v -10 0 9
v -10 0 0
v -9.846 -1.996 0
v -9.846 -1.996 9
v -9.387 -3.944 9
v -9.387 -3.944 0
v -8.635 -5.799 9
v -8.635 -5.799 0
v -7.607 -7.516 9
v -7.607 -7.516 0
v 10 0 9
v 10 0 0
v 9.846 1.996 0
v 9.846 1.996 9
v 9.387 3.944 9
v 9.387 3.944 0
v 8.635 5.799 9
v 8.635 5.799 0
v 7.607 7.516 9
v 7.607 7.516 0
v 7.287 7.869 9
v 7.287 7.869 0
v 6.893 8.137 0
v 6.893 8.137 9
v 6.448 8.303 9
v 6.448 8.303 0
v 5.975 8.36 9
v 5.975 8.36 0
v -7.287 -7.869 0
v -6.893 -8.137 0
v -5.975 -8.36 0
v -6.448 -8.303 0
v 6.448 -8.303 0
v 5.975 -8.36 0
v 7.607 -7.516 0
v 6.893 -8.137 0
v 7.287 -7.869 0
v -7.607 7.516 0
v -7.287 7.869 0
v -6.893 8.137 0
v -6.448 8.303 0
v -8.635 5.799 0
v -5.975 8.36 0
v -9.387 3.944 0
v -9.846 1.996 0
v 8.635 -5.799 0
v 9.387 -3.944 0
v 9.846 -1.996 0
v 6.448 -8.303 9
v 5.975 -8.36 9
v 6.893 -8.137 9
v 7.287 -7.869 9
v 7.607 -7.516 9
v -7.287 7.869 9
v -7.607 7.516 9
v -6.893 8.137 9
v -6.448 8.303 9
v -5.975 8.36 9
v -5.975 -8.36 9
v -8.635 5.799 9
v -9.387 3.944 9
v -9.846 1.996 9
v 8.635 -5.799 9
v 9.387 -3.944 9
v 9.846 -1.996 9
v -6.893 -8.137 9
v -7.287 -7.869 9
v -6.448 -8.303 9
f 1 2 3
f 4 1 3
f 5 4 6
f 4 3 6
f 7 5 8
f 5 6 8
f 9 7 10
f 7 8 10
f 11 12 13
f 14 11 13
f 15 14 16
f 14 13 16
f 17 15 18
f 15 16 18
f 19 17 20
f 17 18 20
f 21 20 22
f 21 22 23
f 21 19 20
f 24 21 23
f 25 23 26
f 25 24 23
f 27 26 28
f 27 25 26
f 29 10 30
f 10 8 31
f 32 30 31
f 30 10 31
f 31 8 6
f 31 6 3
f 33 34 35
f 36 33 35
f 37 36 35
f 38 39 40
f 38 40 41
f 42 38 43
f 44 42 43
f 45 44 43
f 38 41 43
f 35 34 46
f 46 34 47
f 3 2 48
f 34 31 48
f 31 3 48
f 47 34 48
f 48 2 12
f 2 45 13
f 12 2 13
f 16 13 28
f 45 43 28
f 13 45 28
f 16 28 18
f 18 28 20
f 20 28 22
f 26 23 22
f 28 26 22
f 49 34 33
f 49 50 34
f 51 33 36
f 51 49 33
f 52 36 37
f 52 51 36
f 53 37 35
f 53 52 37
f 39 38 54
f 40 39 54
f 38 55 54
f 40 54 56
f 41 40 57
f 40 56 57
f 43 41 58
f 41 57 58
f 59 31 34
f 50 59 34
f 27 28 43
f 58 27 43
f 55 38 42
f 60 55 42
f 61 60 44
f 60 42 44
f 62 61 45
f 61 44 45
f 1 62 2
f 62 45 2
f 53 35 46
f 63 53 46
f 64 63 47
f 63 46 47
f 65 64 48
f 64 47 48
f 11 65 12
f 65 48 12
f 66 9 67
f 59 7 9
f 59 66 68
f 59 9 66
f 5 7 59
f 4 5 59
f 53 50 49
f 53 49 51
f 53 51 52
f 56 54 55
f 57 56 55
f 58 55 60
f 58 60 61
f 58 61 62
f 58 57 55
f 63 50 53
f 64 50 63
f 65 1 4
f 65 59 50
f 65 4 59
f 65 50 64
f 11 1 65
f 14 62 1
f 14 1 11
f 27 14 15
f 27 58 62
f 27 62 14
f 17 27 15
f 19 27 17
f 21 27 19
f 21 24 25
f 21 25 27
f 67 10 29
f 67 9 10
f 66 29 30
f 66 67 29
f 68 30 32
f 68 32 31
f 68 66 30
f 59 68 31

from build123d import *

# Parameters (mm, degrees)
BOSS_EXTRUDE1_DEPTH = 9
FILLET2_R           = 2
FILLET3_R           = 2


with BuildPart() as part:
    # Sketch1 → Boss-Extrude1 (new body)
    with BuildSketch(Plane.XY):
        with BuildLine():
            ThreePointArc((-6.955420634, 8.36), (-9.215164105, 4.44856897), (-10, 0))
            Line((-10, 0), (10, 0))
            ThreePointArc((10, 0), (9.215164105, 4.44856897), (6.955420634, 8.36))
            Line((6.955420634, 8.36), (-6.955420634, 8.36))
        make_face()
        with BuildLine():
            Line((10, 0), (-10, 0))
            ThreePointArc((-10, 0), (-9.215164105, -4.44856897), (-6.955420634, -8.36))
            Line((-6.955420634, -8.36), (6.955420634, -8.36))
            ThreePointArc((6.955420634, -8.36), (9.215164105, -4.44856897), (10, 0))
        make_face()
    extrude(amount=BOSS_EXTRUDE1_DEPTH)

    # Fillet2
    fillet2_edges = [part.edges().sort_by_distance(p)[0] for p in [
        (-6.955420634, 8.36, 4.5),
        (6.955420634, 8.36, 4.5),
    ]]
    fillet(fillet2_edges, radius=FILLET2_R)

    # Fillet3
    fillet3_edges = [part.edges().sort_by_distance(p)[0] for p in [
        (6.955420634, -8.36, 4.5),
        (-6.955420634, -8.36, 4.5),
    ]]
    fillet(fillet3_edges, radius=FILLET3_R)


solid = part.part
